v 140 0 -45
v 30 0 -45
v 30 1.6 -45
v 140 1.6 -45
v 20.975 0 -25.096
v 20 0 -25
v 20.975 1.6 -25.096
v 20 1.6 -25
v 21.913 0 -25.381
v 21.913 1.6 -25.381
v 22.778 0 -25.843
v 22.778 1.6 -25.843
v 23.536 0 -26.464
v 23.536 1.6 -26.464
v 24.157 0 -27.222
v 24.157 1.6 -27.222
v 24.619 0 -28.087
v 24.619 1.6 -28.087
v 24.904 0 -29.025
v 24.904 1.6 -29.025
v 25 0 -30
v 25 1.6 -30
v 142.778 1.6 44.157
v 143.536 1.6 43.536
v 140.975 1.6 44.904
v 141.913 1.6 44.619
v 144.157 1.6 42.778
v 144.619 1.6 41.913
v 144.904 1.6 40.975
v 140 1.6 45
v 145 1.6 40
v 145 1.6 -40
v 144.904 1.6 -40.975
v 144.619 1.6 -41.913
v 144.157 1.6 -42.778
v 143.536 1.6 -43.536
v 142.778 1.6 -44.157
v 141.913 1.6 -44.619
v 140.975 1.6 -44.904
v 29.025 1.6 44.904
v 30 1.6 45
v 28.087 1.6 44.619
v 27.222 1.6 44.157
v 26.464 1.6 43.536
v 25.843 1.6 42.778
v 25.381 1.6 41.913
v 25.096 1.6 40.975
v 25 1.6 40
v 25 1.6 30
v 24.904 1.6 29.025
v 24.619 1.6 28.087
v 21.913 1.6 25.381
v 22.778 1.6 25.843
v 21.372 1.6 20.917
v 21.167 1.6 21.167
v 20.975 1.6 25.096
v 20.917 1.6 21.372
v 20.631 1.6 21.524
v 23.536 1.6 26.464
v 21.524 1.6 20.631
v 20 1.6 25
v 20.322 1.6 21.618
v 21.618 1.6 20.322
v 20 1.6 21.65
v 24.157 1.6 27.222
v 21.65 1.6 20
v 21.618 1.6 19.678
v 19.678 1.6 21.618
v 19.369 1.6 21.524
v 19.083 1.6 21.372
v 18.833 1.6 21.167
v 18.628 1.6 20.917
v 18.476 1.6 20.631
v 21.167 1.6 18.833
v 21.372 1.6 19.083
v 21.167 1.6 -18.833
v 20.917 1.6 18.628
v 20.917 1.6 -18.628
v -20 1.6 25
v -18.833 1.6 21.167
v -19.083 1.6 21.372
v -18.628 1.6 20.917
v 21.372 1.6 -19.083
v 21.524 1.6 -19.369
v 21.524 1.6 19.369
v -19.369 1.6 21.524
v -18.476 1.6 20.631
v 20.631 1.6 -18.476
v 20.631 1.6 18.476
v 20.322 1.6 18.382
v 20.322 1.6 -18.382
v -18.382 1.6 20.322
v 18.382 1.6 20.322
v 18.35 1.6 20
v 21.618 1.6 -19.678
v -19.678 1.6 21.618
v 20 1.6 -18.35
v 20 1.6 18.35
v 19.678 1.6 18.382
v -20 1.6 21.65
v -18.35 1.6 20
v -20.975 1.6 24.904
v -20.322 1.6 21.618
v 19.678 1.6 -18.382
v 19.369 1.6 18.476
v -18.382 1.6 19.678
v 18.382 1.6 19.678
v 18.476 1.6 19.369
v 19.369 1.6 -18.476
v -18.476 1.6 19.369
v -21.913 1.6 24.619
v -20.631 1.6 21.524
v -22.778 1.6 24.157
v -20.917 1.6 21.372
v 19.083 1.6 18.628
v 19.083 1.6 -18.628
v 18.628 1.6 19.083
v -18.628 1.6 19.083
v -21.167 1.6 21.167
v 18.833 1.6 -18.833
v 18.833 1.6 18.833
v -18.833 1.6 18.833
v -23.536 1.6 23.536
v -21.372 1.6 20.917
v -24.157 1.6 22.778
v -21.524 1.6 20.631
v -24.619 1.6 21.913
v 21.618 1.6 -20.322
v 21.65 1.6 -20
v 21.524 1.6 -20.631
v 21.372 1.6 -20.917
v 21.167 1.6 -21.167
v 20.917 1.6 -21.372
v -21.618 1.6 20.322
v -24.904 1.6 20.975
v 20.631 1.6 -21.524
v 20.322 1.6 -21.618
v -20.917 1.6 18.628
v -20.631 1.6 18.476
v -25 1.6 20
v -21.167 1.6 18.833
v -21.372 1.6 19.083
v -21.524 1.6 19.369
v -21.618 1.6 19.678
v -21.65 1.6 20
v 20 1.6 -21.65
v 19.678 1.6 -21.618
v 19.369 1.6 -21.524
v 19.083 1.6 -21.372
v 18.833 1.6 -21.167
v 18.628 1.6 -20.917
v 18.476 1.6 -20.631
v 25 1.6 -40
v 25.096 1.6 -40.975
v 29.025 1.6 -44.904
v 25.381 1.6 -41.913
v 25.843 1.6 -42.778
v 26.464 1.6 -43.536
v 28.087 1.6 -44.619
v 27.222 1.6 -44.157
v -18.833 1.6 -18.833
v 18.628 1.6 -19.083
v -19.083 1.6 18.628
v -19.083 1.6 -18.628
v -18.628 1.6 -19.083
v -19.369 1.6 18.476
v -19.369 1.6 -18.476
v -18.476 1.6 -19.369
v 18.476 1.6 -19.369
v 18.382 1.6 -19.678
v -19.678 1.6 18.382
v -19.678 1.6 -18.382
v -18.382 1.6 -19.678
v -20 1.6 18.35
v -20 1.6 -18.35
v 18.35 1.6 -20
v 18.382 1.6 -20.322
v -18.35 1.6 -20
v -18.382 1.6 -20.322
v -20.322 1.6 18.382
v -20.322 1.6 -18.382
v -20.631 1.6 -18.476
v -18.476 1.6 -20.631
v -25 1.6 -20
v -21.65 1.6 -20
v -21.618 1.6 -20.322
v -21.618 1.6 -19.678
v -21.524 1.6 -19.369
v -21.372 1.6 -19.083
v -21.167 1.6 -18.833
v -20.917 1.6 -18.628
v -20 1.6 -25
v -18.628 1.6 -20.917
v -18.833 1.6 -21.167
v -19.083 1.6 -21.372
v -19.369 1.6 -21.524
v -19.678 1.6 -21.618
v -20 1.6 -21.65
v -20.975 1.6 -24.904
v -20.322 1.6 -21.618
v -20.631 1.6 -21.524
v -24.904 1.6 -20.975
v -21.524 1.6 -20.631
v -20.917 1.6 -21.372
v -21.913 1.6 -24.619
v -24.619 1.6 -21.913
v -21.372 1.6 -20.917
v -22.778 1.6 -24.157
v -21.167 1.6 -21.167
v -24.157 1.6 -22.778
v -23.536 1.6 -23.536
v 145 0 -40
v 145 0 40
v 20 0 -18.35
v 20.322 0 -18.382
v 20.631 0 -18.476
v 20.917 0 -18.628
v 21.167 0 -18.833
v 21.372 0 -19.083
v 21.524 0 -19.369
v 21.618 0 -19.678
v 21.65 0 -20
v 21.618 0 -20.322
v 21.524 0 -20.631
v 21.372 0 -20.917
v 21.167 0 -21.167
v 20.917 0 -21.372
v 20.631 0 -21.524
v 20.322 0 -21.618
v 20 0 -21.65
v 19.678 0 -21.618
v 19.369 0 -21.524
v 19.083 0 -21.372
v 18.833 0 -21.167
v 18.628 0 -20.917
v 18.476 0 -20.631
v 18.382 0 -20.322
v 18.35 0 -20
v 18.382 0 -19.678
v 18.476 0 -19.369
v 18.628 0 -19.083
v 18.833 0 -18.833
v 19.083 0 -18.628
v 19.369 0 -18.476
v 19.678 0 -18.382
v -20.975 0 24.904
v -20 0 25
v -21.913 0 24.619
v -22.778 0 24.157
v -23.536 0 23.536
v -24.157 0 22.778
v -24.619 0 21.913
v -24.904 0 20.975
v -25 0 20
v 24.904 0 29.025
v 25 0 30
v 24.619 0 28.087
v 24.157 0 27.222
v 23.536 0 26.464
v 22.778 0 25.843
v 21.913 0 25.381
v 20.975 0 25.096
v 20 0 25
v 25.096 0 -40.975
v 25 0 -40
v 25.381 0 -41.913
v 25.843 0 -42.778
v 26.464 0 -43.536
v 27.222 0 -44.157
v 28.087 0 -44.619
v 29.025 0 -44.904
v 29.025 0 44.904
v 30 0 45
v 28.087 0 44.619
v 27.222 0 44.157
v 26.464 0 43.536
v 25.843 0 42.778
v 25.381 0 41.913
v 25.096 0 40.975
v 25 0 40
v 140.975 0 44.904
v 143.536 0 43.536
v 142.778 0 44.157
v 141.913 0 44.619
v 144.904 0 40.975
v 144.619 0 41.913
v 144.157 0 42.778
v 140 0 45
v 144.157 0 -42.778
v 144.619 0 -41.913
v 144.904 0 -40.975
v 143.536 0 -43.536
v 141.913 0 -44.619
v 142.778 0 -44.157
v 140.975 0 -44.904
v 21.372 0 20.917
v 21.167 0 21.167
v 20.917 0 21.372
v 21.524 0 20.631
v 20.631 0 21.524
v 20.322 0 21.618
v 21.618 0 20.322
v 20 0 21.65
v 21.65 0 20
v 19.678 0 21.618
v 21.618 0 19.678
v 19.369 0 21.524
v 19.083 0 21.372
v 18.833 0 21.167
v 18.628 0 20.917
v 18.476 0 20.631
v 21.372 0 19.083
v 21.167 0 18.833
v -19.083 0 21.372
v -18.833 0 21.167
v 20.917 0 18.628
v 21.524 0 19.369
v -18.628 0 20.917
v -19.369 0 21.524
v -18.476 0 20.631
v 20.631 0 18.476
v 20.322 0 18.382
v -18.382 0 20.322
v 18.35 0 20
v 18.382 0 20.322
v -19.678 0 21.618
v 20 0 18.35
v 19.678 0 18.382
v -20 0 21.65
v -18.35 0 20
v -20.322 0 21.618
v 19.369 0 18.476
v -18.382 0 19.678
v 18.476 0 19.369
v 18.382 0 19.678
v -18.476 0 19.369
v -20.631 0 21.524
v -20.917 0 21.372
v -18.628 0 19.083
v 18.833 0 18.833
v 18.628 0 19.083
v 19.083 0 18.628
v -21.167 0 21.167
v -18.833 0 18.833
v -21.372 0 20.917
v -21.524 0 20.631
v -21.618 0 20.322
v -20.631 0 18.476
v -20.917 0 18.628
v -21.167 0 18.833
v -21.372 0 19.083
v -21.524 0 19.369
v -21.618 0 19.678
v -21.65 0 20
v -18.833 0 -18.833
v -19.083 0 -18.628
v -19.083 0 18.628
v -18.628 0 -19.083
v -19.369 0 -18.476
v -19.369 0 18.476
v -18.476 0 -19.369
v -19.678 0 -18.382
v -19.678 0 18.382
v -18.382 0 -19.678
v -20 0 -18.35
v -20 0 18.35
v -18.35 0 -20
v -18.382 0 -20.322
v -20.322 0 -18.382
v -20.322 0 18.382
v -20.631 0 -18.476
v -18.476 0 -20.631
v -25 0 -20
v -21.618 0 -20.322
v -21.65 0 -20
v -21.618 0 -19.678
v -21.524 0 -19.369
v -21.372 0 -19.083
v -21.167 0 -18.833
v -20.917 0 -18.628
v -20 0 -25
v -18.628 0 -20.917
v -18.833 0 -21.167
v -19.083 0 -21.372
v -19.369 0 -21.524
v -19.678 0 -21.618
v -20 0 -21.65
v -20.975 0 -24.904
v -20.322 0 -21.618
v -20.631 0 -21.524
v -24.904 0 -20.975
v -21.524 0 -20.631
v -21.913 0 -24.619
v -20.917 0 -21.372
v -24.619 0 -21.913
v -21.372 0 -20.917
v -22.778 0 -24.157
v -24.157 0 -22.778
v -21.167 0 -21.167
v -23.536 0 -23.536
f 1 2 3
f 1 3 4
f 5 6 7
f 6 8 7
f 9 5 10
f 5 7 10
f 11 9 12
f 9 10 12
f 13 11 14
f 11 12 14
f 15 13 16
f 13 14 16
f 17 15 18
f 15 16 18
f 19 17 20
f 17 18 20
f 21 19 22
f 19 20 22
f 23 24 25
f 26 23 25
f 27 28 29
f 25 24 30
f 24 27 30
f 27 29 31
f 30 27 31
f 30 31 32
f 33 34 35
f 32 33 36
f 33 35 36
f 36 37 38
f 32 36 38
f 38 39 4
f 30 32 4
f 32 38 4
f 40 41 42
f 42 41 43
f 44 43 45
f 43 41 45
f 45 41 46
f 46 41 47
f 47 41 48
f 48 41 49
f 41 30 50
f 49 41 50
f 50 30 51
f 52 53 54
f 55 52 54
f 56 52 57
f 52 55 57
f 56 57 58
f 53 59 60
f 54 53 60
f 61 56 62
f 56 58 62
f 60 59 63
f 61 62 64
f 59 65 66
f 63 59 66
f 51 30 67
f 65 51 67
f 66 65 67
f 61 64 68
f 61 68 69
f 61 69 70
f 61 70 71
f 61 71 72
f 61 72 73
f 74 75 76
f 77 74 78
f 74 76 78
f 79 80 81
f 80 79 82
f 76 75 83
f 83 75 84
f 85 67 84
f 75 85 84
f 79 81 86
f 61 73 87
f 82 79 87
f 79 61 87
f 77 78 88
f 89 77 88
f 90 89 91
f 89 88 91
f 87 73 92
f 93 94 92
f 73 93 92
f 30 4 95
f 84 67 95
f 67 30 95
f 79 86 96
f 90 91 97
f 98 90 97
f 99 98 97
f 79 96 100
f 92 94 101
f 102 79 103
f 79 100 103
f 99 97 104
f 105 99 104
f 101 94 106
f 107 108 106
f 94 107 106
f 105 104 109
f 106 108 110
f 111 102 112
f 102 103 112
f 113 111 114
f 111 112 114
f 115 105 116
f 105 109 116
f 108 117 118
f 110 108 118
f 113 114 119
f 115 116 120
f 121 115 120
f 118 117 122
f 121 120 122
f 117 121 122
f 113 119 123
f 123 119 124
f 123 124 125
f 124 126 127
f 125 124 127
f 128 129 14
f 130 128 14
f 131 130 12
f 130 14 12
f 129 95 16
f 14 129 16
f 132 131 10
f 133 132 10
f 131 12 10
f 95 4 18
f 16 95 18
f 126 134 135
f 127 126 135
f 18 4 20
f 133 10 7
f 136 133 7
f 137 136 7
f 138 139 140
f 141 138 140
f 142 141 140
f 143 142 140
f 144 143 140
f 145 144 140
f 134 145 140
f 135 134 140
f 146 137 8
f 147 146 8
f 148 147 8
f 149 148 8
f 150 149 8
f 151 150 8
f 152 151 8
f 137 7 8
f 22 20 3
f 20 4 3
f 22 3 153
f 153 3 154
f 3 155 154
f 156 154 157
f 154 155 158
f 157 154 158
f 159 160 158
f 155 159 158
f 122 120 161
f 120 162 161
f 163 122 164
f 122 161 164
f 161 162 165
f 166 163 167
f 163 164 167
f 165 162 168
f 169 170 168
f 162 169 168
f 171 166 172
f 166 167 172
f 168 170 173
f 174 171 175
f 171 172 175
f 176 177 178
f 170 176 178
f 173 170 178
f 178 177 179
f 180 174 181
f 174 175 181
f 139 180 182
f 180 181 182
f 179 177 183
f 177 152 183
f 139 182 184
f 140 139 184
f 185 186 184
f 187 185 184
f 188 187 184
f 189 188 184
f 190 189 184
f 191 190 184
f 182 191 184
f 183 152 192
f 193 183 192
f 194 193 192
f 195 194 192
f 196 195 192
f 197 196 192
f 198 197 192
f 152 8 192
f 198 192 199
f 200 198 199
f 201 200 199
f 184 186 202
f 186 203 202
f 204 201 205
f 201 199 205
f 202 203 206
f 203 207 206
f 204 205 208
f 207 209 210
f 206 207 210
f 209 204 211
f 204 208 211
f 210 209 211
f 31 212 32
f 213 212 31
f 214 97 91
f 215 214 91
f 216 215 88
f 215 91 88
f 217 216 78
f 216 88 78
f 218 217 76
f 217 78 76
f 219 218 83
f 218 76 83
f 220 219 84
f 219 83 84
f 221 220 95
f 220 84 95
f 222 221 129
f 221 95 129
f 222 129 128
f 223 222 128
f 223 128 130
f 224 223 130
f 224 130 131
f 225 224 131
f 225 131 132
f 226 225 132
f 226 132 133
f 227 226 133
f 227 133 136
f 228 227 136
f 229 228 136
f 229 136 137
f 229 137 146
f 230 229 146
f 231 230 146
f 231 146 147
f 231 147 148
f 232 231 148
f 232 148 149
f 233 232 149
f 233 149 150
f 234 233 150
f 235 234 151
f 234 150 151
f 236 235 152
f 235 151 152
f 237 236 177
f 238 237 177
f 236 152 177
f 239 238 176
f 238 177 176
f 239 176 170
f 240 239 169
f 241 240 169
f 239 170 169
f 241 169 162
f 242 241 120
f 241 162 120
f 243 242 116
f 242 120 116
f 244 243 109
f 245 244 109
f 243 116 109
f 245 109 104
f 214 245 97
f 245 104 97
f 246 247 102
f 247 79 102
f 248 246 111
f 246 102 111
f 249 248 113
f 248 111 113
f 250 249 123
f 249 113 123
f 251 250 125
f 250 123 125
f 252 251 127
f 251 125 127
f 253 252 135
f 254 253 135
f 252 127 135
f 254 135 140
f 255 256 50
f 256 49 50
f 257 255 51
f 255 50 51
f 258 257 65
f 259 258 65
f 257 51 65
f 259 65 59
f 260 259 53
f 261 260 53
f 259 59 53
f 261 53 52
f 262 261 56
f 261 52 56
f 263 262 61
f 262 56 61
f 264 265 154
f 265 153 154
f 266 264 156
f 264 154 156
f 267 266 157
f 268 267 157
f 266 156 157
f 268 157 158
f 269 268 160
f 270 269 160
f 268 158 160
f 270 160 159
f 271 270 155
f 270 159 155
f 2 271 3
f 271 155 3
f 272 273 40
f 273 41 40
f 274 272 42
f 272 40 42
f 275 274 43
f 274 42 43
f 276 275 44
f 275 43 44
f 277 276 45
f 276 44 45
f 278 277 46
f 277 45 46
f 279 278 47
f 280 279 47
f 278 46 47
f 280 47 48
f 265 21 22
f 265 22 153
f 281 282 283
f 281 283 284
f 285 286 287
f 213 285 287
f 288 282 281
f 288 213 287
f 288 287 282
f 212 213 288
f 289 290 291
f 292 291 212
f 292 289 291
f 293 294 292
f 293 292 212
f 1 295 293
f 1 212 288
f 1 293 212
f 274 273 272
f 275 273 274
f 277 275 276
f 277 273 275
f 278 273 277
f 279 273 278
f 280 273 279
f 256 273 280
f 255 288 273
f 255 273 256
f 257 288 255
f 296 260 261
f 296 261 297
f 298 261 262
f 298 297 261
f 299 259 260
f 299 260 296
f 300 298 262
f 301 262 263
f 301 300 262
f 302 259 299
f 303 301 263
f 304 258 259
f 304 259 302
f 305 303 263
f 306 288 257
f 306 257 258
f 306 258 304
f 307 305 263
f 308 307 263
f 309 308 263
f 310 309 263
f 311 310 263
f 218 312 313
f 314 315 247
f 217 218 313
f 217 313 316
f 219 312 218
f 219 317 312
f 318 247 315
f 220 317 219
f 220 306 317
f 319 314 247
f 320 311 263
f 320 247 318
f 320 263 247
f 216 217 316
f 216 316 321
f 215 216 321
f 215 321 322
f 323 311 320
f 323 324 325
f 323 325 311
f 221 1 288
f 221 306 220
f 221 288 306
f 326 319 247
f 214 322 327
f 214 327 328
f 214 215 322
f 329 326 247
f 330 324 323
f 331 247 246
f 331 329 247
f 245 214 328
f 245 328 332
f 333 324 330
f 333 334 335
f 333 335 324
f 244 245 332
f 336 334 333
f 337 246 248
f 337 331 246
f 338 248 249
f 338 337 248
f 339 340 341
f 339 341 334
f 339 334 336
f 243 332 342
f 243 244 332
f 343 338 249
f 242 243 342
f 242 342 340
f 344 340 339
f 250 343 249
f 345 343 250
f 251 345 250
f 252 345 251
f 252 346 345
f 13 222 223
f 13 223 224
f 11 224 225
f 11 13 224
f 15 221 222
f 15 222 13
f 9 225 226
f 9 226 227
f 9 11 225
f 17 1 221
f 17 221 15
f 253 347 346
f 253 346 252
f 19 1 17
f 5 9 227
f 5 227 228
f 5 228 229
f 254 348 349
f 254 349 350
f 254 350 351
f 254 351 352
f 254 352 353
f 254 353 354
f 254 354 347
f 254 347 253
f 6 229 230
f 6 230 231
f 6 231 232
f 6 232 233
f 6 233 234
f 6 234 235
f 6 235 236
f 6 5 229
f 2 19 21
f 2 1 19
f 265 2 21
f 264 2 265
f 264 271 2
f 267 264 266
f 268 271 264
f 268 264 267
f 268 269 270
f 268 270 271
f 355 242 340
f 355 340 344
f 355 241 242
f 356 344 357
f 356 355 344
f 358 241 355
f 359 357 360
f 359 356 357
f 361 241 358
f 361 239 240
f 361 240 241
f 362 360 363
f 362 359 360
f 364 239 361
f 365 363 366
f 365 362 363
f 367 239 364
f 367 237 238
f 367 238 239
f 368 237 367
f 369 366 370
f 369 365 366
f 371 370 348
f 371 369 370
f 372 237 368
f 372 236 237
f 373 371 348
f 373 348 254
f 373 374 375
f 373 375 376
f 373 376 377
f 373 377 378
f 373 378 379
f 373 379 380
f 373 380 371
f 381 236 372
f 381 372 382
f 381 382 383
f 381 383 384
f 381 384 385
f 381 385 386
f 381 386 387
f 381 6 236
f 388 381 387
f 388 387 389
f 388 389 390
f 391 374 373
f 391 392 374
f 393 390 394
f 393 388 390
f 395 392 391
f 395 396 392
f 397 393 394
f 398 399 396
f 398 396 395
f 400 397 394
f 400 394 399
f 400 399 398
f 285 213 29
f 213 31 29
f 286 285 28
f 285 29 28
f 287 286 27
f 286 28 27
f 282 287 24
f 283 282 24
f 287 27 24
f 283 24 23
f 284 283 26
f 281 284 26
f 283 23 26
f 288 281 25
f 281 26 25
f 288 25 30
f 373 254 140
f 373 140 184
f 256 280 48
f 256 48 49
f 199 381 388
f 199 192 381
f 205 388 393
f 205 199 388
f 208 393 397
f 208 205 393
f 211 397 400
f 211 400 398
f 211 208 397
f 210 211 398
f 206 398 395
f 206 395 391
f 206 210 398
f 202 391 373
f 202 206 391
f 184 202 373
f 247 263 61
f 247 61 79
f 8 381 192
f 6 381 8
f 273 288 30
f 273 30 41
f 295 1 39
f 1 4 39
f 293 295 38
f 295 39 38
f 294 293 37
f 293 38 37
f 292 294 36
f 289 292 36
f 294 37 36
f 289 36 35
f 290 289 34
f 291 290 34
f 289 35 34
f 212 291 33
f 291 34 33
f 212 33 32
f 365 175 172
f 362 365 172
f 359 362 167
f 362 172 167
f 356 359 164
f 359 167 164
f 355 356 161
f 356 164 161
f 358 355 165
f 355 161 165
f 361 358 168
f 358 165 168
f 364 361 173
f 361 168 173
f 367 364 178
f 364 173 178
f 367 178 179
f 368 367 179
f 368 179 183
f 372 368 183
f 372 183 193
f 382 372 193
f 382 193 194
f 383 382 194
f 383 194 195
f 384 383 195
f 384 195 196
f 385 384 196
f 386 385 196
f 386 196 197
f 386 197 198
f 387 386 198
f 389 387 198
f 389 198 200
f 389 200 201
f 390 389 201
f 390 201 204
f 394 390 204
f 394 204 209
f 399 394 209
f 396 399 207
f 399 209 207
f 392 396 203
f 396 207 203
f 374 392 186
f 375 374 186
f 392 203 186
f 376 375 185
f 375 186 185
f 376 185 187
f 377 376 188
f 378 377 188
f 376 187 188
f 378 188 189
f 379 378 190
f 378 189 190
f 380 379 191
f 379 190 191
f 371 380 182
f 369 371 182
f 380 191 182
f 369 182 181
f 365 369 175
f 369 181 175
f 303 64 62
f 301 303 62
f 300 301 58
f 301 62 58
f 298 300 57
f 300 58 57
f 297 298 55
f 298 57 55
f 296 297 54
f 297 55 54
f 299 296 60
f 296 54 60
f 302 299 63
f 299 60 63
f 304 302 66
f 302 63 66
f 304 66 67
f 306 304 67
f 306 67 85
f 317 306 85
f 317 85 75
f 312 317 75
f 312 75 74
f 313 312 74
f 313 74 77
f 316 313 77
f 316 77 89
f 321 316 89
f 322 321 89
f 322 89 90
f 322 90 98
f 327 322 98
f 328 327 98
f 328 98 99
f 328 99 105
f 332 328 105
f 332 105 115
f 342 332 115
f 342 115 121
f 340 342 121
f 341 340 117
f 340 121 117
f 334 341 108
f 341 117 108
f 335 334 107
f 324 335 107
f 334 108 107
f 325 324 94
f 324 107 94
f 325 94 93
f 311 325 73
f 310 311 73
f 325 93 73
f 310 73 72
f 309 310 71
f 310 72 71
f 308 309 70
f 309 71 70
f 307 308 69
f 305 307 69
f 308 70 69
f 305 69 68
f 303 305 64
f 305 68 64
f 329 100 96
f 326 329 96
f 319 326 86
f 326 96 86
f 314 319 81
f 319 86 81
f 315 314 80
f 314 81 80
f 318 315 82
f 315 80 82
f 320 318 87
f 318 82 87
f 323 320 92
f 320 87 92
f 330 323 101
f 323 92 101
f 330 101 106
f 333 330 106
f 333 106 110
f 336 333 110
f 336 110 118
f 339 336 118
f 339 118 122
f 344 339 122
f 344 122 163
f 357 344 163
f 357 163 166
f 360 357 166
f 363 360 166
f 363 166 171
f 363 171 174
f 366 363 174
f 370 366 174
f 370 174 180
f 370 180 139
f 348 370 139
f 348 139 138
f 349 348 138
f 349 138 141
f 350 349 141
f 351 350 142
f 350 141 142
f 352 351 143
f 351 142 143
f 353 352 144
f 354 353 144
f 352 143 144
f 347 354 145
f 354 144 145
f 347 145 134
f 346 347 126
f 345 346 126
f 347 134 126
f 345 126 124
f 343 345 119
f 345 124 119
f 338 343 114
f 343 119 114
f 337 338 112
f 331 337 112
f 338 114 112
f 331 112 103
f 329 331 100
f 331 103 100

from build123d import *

# Parameters (mm, degrees)
BOSS_EXTRUDE1_DEPTH = 1.6
FILLET1_R           = 5
SKETCH2_R           = 1.65
CUT_EXTRUDE1_DEPTH  = 152.830695184


with BuildPart() as part:
    # Sketch1 → Boss-Extrude1 (new body)
    with BuildSketch(Plane(origin=(0, 0, 0), x_dir=(1, 0, 0), z_dir=(0, 1, 0))):
        Polygon((-25, 25), (25, 25), (25, 45), (145, 45), (145, -45), (25, -45), (25, -25), (-25, -25), align=None)
    extrude(amount=BOSS_EXTRUDE1_DEPTH)

    # Fillet1
    fillet1_edges = [part.edges().sort_by_distance(p)[0] for p in [
        (-25, 0.8, 25),
        (-25, 0.8, -25),
        (25, 0.8, -25),
        (25, 0.8, -45),
        (145, 0.8, -45),
        (145, 0.8, 45),
        (25, 0.8, 45),
        (25, 0.8, 25),
    ]]
    fillet(fillet1_edges, radius=FILLET1_R)

    # Sketch2 → Cut-Extrude1 (cut, through all)
    with BuildSketch(Plane(origin=(0, 1.6, 0), x_dir=(1, 0, 0), z_dir=(0, 1, 0))):
        with Locations(Location((-20, 20, 0), (0, 0, 270))):
            Circle(SKETCH2_R)
        with Locations(Location((20, 20, 0), (0, 0, 270))):
            Circle(SKETCH2_R)
        with Locations(Location((20, -20, 0), (0, 0, 270))):
            Circle(SKETCH2_R)
        with Locations(Location((-20, -20, 0), (0, 0, 270))):
            Circle(SKETCH2_R)
    extrude(amount=-CUT_EXTRUDE1_DEPTH, mode=Mode.SUBTRACT)


solid = part.part
